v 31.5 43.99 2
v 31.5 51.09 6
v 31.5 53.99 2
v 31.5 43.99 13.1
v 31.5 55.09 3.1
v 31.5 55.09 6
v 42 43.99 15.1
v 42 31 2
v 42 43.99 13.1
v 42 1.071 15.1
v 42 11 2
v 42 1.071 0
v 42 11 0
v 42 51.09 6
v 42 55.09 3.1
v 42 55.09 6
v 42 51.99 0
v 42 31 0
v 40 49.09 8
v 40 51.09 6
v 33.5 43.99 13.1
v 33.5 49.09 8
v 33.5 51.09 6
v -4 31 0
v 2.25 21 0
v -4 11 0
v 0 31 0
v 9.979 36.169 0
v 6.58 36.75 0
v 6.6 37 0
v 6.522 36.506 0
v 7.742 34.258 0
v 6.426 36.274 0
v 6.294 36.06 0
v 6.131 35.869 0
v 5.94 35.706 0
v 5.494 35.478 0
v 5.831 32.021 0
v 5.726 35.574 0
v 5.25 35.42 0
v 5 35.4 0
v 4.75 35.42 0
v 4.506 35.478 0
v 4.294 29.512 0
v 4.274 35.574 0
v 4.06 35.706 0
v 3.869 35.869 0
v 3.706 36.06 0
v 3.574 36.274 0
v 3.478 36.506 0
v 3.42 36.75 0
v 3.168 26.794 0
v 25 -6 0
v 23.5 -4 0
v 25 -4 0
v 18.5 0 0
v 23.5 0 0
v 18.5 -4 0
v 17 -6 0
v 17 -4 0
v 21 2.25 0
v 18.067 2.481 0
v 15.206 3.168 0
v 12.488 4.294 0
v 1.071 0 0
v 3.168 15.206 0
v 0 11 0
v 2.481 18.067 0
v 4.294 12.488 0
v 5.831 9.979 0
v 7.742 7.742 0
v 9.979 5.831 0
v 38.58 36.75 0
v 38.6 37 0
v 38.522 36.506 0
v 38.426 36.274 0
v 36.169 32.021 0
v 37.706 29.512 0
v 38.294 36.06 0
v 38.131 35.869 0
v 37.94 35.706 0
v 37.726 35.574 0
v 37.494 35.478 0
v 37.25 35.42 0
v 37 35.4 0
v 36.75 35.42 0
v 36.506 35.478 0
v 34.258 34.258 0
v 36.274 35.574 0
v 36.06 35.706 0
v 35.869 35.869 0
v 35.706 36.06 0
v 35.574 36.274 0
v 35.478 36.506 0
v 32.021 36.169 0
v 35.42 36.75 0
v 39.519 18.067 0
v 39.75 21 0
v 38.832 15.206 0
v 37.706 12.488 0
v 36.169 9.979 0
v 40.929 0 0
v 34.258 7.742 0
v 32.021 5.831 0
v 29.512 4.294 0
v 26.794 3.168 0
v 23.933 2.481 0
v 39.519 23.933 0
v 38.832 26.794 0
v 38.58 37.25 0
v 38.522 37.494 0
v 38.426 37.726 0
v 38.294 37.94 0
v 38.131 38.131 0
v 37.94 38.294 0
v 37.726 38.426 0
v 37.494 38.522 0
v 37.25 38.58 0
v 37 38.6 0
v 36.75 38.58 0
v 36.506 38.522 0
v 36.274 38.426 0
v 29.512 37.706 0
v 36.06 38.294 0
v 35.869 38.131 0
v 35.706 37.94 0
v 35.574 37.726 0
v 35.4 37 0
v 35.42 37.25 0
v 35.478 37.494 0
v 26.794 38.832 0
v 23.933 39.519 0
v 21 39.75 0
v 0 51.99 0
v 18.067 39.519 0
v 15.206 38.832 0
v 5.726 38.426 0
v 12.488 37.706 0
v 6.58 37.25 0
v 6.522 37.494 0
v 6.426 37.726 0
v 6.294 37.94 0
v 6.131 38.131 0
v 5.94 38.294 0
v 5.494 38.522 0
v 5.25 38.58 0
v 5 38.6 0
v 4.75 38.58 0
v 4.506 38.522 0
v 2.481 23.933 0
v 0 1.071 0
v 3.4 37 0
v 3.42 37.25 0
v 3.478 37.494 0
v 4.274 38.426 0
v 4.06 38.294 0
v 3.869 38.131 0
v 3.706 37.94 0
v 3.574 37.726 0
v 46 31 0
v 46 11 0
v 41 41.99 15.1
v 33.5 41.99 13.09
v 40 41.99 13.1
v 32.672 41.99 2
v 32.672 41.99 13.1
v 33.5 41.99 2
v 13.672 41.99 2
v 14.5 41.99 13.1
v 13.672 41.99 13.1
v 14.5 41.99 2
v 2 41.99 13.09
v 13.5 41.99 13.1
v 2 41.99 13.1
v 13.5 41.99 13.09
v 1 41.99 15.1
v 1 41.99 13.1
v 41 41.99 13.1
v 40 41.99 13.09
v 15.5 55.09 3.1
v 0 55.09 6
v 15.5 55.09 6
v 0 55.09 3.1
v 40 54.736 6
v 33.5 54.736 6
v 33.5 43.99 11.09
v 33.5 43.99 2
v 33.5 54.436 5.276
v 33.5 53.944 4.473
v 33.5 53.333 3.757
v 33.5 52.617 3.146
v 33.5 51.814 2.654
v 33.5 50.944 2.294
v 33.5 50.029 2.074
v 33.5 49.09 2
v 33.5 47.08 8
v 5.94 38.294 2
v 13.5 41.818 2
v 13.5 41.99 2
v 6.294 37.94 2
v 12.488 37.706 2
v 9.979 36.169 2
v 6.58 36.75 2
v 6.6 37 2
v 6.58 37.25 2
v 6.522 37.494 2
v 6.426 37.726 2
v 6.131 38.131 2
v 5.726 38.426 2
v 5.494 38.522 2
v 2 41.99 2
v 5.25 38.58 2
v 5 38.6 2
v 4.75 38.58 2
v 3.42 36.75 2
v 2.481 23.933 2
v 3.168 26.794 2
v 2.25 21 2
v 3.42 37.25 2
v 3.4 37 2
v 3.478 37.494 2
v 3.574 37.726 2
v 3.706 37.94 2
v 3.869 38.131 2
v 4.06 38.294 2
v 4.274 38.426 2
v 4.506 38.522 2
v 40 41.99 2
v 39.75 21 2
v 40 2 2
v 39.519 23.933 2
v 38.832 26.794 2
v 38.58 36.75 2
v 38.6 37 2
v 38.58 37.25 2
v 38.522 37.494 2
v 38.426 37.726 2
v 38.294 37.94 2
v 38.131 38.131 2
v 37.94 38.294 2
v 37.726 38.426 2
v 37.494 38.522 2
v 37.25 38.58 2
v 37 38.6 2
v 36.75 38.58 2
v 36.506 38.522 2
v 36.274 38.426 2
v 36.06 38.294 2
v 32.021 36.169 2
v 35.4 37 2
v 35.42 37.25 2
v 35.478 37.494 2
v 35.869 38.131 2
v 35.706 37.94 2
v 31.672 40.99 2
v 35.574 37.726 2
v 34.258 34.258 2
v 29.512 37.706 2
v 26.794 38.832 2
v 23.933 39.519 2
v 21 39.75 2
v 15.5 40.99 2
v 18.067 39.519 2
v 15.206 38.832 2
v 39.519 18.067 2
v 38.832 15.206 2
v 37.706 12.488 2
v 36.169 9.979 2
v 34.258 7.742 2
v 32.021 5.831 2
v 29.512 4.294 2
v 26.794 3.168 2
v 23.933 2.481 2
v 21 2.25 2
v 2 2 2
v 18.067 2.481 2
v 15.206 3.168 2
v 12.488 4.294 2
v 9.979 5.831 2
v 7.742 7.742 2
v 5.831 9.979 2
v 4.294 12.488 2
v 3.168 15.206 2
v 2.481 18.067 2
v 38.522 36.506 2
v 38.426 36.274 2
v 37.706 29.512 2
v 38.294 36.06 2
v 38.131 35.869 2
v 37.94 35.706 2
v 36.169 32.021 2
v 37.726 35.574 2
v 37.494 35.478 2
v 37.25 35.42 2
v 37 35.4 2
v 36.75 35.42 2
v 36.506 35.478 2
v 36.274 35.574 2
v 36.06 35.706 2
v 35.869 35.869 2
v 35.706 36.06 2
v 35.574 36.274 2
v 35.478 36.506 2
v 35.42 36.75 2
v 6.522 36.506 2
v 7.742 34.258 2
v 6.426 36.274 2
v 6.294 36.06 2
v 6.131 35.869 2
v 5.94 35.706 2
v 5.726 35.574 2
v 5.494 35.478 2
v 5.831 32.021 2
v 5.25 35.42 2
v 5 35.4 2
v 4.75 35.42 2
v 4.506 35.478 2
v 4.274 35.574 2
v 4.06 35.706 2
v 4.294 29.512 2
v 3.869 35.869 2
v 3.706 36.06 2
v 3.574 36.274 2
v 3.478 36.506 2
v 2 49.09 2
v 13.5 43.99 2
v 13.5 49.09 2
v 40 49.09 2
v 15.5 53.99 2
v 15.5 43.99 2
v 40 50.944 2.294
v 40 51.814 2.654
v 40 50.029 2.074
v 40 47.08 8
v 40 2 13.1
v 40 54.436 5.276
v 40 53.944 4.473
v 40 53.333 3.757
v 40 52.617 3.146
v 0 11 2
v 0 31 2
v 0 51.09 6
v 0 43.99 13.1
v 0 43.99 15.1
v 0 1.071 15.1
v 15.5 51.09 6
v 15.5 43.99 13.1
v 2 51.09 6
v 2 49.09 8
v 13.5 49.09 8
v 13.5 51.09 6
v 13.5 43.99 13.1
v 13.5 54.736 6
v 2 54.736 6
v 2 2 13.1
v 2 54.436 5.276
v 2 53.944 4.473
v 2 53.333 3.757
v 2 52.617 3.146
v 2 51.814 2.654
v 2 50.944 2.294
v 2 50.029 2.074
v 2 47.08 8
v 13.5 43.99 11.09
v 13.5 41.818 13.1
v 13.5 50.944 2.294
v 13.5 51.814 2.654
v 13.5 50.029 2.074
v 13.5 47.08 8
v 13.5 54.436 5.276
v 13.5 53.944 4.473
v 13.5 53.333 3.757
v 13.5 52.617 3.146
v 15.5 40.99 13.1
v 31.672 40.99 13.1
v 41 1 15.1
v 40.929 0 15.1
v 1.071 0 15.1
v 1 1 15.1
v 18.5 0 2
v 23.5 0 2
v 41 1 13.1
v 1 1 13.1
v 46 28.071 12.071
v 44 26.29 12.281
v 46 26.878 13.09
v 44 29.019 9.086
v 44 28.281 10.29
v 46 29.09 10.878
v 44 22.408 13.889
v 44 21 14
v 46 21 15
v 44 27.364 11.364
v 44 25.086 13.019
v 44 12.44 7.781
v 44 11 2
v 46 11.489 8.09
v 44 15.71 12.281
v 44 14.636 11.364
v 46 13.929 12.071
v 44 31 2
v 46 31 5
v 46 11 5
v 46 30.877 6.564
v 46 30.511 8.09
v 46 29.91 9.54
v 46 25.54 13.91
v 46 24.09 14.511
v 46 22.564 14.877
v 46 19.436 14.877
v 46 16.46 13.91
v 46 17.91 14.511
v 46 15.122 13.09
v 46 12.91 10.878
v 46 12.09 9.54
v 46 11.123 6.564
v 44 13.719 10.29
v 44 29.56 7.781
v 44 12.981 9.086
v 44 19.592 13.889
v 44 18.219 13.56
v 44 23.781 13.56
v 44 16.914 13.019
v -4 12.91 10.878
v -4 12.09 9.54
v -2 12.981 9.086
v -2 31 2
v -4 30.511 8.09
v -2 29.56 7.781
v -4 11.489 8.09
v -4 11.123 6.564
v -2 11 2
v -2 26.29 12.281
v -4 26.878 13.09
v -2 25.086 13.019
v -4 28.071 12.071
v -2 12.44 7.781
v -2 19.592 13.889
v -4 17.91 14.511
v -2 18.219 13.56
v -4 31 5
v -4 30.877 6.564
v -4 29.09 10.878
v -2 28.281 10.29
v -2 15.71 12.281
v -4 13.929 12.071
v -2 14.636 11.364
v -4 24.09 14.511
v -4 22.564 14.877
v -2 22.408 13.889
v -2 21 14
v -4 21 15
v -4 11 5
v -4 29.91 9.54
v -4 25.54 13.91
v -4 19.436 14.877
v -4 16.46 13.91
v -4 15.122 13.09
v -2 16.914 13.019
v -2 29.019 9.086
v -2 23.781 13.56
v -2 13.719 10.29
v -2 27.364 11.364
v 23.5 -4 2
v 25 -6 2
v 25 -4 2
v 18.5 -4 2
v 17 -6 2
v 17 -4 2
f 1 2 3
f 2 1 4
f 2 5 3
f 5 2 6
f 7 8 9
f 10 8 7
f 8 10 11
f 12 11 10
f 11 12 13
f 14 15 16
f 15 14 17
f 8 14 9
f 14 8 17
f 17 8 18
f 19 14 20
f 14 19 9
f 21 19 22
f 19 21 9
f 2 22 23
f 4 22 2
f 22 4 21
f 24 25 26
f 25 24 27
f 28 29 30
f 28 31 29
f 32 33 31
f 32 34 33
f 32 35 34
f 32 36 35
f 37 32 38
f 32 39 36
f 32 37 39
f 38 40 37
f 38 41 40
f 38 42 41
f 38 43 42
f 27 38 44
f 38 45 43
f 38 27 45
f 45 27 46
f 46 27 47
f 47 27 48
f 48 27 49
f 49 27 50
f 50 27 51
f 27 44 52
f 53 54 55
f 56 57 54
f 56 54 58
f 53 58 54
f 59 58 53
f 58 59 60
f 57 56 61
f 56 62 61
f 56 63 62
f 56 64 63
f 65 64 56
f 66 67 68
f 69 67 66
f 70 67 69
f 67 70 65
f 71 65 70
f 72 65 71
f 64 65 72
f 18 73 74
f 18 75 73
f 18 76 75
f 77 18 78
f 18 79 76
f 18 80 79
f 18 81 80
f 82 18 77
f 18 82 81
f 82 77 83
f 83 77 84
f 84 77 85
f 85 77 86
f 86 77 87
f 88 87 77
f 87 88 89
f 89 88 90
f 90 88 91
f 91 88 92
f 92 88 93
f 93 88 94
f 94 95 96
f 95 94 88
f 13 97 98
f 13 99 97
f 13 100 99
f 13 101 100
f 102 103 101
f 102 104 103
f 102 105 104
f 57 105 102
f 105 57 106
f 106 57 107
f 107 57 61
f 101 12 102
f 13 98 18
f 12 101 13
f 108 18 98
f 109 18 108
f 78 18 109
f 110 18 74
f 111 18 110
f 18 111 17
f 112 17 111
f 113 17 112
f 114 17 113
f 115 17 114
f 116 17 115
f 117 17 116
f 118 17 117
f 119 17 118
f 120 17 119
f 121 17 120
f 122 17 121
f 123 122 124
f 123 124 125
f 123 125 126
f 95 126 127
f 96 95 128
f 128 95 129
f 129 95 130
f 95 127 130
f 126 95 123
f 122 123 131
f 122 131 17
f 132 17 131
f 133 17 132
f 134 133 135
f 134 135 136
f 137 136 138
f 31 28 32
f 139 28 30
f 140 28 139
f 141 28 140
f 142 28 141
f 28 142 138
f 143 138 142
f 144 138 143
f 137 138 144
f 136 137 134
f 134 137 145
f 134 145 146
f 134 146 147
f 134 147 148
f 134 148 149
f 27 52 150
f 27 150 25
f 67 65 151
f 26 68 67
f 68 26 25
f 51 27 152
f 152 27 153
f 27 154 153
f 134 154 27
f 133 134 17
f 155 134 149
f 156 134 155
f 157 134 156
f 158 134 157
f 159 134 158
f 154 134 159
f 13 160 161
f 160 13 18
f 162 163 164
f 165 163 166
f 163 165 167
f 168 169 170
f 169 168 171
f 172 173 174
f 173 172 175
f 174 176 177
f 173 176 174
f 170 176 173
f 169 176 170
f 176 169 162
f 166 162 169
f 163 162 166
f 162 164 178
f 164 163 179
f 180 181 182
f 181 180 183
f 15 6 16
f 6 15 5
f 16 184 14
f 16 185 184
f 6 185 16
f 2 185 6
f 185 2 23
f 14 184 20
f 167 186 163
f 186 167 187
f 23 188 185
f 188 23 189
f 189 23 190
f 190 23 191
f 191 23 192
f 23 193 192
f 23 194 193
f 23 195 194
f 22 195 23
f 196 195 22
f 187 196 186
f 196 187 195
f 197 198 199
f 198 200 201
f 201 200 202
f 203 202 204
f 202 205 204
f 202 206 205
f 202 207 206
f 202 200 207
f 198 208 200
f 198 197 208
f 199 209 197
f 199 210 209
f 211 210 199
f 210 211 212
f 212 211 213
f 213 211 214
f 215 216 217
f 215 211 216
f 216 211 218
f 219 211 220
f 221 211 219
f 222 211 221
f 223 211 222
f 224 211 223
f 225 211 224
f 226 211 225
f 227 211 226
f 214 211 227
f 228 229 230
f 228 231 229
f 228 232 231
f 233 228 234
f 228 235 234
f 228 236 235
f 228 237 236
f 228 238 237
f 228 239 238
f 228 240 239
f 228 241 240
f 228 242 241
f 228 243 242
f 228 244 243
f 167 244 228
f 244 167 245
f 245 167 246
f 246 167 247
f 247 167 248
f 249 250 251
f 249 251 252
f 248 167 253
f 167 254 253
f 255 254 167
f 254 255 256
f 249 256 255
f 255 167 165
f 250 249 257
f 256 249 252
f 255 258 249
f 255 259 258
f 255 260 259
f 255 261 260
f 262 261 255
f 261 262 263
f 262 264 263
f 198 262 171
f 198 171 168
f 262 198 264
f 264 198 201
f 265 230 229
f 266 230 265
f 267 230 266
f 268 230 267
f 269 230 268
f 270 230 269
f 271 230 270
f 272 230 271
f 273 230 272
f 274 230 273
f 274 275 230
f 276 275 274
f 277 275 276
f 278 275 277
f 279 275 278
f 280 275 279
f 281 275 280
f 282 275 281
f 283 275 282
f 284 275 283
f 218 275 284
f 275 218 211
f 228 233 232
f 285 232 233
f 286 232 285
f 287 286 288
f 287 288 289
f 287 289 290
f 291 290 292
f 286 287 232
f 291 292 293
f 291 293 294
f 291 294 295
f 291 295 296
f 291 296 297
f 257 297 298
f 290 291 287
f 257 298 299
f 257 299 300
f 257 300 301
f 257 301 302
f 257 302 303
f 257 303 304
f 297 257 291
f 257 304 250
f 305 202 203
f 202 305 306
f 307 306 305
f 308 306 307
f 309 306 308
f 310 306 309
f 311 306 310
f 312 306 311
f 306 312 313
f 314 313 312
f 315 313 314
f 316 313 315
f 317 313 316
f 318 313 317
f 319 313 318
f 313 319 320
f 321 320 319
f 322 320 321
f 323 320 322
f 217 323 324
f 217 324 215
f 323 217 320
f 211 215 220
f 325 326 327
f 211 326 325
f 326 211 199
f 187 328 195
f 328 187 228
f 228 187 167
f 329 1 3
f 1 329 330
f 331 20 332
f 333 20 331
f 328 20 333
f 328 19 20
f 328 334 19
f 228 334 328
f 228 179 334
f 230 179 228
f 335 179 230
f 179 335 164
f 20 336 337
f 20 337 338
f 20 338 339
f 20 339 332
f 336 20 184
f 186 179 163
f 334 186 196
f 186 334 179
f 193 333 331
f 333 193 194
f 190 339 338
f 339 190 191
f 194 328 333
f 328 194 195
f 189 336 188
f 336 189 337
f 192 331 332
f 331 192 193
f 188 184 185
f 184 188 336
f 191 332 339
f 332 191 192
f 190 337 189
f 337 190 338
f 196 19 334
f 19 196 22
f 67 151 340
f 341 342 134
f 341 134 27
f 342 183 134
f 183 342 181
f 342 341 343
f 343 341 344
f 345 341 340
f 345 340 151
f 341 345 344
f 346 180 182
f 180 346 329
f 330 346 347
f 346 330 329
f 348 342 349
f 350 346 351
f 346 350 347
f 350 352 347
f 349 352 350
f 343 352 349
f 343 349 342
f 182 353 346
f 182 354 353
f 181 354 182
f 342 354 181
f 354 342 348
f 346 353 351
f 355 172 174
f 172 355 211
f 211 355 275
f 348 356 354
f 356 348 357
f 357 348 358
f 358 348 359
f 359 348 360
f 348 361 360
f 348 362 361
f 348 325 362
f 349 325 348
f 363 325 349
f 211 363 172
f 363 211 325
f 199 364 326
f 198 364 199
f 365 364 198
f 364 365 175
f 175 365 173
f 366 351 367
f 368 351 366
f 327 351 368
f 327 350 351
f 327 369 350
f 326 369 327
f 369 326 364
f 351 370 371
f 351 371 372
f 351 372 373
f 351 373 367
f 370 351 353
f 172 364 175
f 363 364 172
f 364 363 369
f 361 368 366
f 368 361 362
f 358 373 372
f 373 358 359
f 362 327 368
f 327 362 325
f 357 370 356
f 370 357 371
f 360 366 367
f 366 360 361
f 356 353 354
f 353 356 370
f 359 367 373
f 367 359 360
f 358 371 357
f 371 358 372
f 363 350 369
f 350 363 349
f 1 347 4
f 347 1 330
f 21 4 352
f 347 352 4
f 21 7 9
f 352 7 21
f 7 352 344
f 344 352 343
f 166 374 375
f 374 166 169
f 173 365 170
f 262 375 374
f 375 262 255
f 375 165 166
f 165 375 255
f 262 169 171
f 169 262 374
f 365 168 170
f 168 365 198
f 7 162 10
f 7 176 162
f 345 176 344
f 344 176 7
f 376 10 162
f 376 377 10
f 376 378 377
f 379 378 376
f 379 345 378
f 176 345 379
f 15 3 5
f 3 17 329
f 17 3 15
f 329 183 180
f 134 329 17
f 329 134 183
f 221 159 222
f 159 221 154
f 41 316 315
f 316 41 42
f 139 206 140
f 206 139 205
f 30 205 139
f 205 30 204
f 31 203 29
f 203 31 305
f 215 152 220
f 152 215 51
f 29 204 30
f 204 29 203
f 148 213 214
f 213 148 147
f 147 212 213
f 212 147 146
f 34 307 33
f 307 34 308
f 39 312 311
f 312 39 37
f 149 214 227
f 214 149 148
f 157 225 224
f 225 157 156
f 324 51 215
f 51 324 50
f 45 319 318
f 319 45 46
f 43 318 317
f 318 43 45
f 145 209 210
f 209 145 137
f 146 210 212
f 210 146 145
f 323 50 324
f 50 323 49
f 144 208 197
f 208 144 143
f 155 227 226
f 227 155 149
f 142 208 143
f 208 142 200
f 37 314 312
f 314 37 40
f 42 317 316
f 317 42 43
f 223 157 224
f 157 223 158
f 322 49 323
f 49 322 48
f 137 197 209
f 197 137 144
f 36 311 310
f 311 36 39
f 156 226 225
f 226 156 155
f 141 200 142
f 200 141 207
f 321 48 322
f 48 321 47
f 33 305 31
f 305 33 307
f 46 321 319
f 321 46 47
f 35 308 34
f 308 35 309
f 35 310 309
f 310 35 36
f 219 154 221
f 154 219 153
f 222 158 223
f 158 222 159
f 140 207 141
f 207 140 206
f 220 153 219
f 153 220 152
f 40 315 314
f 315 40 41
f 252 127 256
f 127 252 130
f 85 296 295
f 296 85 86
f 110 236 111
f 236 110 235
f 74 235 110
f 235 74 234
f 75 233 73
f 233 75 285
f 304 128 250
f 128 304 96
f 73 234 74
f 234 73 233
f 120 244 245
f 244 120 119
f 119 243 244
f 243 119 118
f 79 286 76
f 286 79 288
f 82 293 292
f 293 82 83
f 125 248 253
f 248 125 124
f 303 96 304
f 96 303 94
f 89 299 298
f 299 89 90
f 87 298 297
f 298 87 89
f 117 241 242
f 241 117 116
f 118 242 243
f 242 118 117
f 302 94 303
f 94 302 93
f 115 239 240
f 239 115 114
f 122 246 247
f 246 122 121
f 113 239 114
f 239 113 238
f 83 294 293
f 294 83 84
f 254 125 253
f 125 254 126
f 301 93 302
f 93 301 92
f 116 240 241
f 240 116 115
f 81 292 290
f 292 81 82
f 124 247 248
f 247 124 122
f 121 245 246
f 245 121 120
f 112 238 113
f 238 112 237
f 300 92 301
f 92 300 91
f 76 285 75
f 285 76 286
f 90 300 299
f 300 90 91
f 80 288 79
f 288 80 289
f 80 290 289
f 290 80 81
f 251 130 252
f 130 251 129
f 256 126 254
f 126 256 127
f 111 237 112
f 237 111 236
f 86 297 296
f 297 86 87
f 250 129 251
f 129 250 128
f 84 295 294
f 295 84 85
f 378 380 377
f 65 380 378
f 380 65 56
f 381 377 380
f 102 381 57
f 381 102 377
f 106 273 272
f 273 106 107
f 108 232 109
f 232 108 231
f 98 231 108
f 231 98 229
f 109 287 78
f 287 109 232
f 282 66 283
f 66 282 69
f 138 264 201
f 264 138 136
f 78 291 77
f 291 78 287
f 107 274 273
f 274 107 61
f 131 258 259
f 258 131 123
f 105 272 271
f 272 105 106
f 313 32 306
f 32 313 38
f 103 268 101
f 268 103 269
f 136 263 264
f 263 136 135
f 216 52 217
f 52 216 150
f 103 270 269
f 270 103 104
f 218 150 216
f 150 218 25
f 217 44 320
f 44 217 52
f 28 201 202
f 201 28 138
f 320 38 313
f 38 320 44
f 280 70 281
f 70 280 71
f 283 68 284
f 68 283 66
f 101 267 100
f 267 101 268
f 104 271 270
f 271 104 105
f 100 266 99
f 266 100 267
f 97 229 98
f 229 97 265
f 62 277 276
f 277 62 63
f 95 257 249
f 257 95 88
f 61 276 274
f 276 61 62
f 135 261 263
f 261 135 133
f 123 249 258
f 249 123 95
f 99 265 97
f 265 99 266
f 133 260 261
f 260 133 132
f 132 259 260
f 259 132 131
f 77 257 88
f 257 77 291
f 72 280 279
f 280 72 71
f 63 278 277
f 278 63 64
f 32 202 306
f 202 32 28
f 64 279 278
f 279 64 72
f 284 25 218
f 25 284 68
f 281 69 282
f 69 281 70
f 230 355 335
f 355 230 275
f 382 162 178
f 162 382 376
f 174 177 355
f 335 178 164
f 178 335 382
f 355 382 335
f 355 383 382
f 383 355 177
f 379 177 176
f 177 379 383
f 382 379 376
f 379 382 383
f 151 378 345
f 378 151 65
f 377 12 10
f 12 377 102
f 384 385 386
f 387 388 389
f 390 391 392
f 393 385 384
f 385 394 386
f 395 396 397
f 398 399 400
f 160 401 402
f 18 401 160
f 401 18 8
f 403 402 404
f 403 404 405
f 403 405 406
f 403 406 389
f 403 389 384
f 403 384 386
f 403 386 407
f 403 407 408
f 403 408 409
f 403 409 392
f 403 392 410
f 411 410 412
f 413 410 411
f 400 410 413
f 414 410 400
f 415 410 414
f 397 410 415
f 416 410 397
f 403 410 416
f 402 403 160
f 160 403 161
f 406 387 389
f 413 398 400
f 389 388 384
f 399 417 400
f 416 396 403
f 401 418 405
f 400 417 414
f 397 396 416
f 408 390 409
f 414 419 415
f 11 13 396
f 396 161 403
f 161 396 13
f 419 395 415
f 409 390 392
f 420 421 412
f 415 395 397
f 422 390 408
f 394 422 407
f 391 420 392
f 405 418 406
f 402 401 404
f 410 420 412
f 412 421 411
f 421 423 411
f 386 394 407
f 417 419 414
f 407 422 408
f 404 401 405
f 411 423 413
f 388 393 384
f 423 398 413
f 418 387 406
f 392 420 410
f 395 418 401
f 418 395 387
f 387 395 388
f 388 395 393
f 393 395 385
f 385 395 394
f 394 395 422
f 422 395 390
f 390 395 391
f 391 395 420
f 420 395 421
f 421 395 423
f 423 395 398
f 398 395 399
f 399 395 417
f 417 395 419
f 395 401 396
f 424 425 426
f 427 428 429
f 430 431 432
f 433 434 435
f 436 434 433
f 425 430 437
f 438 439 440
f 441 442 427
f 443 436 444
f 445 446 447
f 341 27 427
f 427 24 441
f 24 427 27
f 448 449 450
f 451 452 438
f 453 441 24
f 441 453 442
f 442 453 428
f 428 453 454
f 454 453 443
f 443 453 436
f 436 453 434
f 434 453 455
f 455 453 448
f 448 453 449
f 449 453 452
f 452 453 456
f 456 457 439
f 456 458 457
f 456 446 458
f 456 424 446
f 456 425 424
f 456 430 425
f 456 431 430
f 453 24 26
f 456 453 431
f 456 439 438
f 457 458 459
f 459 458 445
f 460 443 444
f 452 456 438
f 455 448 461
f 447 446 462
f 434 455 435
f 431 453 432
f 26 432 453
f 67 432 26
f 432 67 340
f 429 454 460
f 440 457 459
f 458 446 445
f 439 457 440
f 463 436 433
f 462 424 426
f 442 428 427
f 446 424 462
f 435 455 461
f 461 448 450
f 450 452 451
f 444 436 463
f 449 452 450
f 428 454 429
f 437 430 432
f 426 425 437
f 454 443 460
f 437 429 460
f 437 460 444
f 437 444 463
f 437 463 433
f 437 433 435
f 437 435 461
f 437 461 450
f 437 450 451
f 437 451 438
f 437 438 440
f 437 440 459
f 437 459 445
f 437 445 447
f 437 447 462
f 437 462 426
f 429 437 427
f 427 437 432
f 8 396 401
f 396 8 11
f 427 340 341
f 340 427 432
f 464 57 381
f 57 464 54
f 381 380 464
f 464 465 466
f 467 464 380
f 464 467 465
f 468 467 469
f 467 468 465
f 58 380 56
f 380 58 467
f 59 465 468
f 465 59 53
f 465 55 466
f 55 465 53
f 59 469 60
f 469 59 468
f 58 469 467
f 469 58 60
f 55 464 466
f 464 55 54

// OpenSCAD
$fn=40;
//hotend duct 
sc = 32; //Screw Centres
wall=2;
hole = 37.5;  //fan hole
x=42;
y=x;
z=15.10;
heo = 2.5; //hot end offset
hbr = 16; //heat block recess

ventB=(x/2)-(hbr/2)+heo;
ventS=(x/2)-(hbr/2)-heo;

module prism(l, w, h) {
	translate([0, l, 0]) rotate( a= [90, 0, 0]) 
	linear_extrude(height = l) polygon(points = [
		[0, 0],
		[w, 0],
		[0, h]
	], paths=[[0,2,1]]);
}

module vHole(len) {
	difference() {
		union() {
			cube([10-6,len,6]);
			translate([10-6,len,6]) rotate([90,0,0]) cylinder(len,6,6);
		}
		translate ([-7,-1,6]) cube([16,len+2,10]);
		translate ([-7,-1,0]) cube([6,len+2,7]);
	}
}


//Vents
translate([x,y-0.01,0]) rotate([0,0,90]) {
difference() {
	union() {
	difference() {
		union() {
			prism(ventS,z,z);
			translate([z-6,0,0]) cube([4,ventS,6]);
		}
		difference() {
			translate([-.01,wall,wall]) prism(ventS-(wall*2),z-(wall*2),z-(wall*2));
			translate([6,0,0]) cube([6,ventS,6]);
		}
		
		translate([z-12,wall,wall]) vHole(ventS-(wall*2));
	}

	translate([0,ventS+hbr,0]) { //Small Vent
		difference() { //Big Vent
			union() {
				prism(ventB,z,z);
				translate([z-6,0,0]) cube([4,ventB,6]);
			}
			difference() {
				translate([-.01,wall,wall]) prism(ventB-(wall*2),z-(wall*2),z-(wall*2));
				translate([6,0,0]) cube([6,ventB,6]);
			}
			translate([z-12,wall,wall]) vHole(ventB-(wall*2));
		}
	}
	cube([z-2,y,wall]); //Base
	translate([0,0,z-wall]) cube([wall,y,wall]); //top of slope edging strip
	difference() {
		translate([-wall/2,ventS-wall,wall]) cube([wall+1,hbr+(wall*2),z-(wall*2)]); //vent join

		translate([-1,ventS-3,wall]) rotate([0,0,45]) cube([wall,wall,z-(wall*2)]); //vent join bevel
		translate([-1,hbr+ventS,wall]) rotate([0,0,45]) cube([wall,wall,z-(wall*2)]); //vent join bevel
	}
	}
	translate([10,-1,0]) rotate([0,45,0]) cube([10,y+2,10]);
}

}

//Body
difference() {
	cube([x,y,z]); //outer block
	translate([x/2,x/2,-.1]) cylinder(20,hole/2,hole/2); //fan hole
	translate([wall,wall,2]) cube([x-(wall*2), x, 20]); //heatsink hole
	translate([wall-1,wall-1,z-2]) cube([x-(wall), x, 20]); //heatsink recess
	
	for(xp = [0:1]) { //4 x screw holes
		for(yp = [1:1]) { // dont need 4 screw holes so changed [0:1] to [1:1]
			//hull() { //hull to make slots
			translate([((x-sc)/2) + (xp*sc),((x-sc)/2) + (yp*sc),-.1]) cylinder(3,1.6,1.6);
			//translate([((x-sc)/2) + (xp*sc),((x-sc)/2) + (yp*sc)+2,-.1]) cylinder(3,1.5,1.5);
			//}
		}
	}
	translate([0,-6,-1]) rotate([0,0,45]) cube([5,5,z+2]);
	translate([x,-6,-1]) rotate([0,0,45]) cube([5,5,z+2]);
}


//Cable Traps
translate([x,(y/2)-10,0]) cube([wall*2,20,2]); //right cable trap
	difference() {
	hull() {
		translate([x+wall,(y/2),5]) rotate([0,90,0]) cylinder(wall,9,10); //right cable trap
		translate([x+wall,(y/2)-10,0]) cube([wall,20,2]); //right cable trap
	}
	translate([x+wall-.1,(y/2)-10,-10]) cube([wall+.2,20,10]); //remove bottom cylinder
}

translate([-wall*2,(y/2)-10,0]) cube([wall*2,20,2]); //left cable trap
	difference() {
	hull() {
		translate([-wall*2,(y/2),5]) rotate([0,90,0]) cylinder(wall,10,9); 
		translate([-wall*2,(y/2)-10,0]) cube([wall,20,2]); 
	}
	translate([-(wall*2)-.1,(y/2)-10,-10]) cube([wall+.2,20,10]); //remove bottom cylinder
}

//Tie Wrap T
translate([x/2-2.5,-6,0]) cube([5,6,2]);
translate([x/2-4,-6,0]) cube([8,2,2]);
